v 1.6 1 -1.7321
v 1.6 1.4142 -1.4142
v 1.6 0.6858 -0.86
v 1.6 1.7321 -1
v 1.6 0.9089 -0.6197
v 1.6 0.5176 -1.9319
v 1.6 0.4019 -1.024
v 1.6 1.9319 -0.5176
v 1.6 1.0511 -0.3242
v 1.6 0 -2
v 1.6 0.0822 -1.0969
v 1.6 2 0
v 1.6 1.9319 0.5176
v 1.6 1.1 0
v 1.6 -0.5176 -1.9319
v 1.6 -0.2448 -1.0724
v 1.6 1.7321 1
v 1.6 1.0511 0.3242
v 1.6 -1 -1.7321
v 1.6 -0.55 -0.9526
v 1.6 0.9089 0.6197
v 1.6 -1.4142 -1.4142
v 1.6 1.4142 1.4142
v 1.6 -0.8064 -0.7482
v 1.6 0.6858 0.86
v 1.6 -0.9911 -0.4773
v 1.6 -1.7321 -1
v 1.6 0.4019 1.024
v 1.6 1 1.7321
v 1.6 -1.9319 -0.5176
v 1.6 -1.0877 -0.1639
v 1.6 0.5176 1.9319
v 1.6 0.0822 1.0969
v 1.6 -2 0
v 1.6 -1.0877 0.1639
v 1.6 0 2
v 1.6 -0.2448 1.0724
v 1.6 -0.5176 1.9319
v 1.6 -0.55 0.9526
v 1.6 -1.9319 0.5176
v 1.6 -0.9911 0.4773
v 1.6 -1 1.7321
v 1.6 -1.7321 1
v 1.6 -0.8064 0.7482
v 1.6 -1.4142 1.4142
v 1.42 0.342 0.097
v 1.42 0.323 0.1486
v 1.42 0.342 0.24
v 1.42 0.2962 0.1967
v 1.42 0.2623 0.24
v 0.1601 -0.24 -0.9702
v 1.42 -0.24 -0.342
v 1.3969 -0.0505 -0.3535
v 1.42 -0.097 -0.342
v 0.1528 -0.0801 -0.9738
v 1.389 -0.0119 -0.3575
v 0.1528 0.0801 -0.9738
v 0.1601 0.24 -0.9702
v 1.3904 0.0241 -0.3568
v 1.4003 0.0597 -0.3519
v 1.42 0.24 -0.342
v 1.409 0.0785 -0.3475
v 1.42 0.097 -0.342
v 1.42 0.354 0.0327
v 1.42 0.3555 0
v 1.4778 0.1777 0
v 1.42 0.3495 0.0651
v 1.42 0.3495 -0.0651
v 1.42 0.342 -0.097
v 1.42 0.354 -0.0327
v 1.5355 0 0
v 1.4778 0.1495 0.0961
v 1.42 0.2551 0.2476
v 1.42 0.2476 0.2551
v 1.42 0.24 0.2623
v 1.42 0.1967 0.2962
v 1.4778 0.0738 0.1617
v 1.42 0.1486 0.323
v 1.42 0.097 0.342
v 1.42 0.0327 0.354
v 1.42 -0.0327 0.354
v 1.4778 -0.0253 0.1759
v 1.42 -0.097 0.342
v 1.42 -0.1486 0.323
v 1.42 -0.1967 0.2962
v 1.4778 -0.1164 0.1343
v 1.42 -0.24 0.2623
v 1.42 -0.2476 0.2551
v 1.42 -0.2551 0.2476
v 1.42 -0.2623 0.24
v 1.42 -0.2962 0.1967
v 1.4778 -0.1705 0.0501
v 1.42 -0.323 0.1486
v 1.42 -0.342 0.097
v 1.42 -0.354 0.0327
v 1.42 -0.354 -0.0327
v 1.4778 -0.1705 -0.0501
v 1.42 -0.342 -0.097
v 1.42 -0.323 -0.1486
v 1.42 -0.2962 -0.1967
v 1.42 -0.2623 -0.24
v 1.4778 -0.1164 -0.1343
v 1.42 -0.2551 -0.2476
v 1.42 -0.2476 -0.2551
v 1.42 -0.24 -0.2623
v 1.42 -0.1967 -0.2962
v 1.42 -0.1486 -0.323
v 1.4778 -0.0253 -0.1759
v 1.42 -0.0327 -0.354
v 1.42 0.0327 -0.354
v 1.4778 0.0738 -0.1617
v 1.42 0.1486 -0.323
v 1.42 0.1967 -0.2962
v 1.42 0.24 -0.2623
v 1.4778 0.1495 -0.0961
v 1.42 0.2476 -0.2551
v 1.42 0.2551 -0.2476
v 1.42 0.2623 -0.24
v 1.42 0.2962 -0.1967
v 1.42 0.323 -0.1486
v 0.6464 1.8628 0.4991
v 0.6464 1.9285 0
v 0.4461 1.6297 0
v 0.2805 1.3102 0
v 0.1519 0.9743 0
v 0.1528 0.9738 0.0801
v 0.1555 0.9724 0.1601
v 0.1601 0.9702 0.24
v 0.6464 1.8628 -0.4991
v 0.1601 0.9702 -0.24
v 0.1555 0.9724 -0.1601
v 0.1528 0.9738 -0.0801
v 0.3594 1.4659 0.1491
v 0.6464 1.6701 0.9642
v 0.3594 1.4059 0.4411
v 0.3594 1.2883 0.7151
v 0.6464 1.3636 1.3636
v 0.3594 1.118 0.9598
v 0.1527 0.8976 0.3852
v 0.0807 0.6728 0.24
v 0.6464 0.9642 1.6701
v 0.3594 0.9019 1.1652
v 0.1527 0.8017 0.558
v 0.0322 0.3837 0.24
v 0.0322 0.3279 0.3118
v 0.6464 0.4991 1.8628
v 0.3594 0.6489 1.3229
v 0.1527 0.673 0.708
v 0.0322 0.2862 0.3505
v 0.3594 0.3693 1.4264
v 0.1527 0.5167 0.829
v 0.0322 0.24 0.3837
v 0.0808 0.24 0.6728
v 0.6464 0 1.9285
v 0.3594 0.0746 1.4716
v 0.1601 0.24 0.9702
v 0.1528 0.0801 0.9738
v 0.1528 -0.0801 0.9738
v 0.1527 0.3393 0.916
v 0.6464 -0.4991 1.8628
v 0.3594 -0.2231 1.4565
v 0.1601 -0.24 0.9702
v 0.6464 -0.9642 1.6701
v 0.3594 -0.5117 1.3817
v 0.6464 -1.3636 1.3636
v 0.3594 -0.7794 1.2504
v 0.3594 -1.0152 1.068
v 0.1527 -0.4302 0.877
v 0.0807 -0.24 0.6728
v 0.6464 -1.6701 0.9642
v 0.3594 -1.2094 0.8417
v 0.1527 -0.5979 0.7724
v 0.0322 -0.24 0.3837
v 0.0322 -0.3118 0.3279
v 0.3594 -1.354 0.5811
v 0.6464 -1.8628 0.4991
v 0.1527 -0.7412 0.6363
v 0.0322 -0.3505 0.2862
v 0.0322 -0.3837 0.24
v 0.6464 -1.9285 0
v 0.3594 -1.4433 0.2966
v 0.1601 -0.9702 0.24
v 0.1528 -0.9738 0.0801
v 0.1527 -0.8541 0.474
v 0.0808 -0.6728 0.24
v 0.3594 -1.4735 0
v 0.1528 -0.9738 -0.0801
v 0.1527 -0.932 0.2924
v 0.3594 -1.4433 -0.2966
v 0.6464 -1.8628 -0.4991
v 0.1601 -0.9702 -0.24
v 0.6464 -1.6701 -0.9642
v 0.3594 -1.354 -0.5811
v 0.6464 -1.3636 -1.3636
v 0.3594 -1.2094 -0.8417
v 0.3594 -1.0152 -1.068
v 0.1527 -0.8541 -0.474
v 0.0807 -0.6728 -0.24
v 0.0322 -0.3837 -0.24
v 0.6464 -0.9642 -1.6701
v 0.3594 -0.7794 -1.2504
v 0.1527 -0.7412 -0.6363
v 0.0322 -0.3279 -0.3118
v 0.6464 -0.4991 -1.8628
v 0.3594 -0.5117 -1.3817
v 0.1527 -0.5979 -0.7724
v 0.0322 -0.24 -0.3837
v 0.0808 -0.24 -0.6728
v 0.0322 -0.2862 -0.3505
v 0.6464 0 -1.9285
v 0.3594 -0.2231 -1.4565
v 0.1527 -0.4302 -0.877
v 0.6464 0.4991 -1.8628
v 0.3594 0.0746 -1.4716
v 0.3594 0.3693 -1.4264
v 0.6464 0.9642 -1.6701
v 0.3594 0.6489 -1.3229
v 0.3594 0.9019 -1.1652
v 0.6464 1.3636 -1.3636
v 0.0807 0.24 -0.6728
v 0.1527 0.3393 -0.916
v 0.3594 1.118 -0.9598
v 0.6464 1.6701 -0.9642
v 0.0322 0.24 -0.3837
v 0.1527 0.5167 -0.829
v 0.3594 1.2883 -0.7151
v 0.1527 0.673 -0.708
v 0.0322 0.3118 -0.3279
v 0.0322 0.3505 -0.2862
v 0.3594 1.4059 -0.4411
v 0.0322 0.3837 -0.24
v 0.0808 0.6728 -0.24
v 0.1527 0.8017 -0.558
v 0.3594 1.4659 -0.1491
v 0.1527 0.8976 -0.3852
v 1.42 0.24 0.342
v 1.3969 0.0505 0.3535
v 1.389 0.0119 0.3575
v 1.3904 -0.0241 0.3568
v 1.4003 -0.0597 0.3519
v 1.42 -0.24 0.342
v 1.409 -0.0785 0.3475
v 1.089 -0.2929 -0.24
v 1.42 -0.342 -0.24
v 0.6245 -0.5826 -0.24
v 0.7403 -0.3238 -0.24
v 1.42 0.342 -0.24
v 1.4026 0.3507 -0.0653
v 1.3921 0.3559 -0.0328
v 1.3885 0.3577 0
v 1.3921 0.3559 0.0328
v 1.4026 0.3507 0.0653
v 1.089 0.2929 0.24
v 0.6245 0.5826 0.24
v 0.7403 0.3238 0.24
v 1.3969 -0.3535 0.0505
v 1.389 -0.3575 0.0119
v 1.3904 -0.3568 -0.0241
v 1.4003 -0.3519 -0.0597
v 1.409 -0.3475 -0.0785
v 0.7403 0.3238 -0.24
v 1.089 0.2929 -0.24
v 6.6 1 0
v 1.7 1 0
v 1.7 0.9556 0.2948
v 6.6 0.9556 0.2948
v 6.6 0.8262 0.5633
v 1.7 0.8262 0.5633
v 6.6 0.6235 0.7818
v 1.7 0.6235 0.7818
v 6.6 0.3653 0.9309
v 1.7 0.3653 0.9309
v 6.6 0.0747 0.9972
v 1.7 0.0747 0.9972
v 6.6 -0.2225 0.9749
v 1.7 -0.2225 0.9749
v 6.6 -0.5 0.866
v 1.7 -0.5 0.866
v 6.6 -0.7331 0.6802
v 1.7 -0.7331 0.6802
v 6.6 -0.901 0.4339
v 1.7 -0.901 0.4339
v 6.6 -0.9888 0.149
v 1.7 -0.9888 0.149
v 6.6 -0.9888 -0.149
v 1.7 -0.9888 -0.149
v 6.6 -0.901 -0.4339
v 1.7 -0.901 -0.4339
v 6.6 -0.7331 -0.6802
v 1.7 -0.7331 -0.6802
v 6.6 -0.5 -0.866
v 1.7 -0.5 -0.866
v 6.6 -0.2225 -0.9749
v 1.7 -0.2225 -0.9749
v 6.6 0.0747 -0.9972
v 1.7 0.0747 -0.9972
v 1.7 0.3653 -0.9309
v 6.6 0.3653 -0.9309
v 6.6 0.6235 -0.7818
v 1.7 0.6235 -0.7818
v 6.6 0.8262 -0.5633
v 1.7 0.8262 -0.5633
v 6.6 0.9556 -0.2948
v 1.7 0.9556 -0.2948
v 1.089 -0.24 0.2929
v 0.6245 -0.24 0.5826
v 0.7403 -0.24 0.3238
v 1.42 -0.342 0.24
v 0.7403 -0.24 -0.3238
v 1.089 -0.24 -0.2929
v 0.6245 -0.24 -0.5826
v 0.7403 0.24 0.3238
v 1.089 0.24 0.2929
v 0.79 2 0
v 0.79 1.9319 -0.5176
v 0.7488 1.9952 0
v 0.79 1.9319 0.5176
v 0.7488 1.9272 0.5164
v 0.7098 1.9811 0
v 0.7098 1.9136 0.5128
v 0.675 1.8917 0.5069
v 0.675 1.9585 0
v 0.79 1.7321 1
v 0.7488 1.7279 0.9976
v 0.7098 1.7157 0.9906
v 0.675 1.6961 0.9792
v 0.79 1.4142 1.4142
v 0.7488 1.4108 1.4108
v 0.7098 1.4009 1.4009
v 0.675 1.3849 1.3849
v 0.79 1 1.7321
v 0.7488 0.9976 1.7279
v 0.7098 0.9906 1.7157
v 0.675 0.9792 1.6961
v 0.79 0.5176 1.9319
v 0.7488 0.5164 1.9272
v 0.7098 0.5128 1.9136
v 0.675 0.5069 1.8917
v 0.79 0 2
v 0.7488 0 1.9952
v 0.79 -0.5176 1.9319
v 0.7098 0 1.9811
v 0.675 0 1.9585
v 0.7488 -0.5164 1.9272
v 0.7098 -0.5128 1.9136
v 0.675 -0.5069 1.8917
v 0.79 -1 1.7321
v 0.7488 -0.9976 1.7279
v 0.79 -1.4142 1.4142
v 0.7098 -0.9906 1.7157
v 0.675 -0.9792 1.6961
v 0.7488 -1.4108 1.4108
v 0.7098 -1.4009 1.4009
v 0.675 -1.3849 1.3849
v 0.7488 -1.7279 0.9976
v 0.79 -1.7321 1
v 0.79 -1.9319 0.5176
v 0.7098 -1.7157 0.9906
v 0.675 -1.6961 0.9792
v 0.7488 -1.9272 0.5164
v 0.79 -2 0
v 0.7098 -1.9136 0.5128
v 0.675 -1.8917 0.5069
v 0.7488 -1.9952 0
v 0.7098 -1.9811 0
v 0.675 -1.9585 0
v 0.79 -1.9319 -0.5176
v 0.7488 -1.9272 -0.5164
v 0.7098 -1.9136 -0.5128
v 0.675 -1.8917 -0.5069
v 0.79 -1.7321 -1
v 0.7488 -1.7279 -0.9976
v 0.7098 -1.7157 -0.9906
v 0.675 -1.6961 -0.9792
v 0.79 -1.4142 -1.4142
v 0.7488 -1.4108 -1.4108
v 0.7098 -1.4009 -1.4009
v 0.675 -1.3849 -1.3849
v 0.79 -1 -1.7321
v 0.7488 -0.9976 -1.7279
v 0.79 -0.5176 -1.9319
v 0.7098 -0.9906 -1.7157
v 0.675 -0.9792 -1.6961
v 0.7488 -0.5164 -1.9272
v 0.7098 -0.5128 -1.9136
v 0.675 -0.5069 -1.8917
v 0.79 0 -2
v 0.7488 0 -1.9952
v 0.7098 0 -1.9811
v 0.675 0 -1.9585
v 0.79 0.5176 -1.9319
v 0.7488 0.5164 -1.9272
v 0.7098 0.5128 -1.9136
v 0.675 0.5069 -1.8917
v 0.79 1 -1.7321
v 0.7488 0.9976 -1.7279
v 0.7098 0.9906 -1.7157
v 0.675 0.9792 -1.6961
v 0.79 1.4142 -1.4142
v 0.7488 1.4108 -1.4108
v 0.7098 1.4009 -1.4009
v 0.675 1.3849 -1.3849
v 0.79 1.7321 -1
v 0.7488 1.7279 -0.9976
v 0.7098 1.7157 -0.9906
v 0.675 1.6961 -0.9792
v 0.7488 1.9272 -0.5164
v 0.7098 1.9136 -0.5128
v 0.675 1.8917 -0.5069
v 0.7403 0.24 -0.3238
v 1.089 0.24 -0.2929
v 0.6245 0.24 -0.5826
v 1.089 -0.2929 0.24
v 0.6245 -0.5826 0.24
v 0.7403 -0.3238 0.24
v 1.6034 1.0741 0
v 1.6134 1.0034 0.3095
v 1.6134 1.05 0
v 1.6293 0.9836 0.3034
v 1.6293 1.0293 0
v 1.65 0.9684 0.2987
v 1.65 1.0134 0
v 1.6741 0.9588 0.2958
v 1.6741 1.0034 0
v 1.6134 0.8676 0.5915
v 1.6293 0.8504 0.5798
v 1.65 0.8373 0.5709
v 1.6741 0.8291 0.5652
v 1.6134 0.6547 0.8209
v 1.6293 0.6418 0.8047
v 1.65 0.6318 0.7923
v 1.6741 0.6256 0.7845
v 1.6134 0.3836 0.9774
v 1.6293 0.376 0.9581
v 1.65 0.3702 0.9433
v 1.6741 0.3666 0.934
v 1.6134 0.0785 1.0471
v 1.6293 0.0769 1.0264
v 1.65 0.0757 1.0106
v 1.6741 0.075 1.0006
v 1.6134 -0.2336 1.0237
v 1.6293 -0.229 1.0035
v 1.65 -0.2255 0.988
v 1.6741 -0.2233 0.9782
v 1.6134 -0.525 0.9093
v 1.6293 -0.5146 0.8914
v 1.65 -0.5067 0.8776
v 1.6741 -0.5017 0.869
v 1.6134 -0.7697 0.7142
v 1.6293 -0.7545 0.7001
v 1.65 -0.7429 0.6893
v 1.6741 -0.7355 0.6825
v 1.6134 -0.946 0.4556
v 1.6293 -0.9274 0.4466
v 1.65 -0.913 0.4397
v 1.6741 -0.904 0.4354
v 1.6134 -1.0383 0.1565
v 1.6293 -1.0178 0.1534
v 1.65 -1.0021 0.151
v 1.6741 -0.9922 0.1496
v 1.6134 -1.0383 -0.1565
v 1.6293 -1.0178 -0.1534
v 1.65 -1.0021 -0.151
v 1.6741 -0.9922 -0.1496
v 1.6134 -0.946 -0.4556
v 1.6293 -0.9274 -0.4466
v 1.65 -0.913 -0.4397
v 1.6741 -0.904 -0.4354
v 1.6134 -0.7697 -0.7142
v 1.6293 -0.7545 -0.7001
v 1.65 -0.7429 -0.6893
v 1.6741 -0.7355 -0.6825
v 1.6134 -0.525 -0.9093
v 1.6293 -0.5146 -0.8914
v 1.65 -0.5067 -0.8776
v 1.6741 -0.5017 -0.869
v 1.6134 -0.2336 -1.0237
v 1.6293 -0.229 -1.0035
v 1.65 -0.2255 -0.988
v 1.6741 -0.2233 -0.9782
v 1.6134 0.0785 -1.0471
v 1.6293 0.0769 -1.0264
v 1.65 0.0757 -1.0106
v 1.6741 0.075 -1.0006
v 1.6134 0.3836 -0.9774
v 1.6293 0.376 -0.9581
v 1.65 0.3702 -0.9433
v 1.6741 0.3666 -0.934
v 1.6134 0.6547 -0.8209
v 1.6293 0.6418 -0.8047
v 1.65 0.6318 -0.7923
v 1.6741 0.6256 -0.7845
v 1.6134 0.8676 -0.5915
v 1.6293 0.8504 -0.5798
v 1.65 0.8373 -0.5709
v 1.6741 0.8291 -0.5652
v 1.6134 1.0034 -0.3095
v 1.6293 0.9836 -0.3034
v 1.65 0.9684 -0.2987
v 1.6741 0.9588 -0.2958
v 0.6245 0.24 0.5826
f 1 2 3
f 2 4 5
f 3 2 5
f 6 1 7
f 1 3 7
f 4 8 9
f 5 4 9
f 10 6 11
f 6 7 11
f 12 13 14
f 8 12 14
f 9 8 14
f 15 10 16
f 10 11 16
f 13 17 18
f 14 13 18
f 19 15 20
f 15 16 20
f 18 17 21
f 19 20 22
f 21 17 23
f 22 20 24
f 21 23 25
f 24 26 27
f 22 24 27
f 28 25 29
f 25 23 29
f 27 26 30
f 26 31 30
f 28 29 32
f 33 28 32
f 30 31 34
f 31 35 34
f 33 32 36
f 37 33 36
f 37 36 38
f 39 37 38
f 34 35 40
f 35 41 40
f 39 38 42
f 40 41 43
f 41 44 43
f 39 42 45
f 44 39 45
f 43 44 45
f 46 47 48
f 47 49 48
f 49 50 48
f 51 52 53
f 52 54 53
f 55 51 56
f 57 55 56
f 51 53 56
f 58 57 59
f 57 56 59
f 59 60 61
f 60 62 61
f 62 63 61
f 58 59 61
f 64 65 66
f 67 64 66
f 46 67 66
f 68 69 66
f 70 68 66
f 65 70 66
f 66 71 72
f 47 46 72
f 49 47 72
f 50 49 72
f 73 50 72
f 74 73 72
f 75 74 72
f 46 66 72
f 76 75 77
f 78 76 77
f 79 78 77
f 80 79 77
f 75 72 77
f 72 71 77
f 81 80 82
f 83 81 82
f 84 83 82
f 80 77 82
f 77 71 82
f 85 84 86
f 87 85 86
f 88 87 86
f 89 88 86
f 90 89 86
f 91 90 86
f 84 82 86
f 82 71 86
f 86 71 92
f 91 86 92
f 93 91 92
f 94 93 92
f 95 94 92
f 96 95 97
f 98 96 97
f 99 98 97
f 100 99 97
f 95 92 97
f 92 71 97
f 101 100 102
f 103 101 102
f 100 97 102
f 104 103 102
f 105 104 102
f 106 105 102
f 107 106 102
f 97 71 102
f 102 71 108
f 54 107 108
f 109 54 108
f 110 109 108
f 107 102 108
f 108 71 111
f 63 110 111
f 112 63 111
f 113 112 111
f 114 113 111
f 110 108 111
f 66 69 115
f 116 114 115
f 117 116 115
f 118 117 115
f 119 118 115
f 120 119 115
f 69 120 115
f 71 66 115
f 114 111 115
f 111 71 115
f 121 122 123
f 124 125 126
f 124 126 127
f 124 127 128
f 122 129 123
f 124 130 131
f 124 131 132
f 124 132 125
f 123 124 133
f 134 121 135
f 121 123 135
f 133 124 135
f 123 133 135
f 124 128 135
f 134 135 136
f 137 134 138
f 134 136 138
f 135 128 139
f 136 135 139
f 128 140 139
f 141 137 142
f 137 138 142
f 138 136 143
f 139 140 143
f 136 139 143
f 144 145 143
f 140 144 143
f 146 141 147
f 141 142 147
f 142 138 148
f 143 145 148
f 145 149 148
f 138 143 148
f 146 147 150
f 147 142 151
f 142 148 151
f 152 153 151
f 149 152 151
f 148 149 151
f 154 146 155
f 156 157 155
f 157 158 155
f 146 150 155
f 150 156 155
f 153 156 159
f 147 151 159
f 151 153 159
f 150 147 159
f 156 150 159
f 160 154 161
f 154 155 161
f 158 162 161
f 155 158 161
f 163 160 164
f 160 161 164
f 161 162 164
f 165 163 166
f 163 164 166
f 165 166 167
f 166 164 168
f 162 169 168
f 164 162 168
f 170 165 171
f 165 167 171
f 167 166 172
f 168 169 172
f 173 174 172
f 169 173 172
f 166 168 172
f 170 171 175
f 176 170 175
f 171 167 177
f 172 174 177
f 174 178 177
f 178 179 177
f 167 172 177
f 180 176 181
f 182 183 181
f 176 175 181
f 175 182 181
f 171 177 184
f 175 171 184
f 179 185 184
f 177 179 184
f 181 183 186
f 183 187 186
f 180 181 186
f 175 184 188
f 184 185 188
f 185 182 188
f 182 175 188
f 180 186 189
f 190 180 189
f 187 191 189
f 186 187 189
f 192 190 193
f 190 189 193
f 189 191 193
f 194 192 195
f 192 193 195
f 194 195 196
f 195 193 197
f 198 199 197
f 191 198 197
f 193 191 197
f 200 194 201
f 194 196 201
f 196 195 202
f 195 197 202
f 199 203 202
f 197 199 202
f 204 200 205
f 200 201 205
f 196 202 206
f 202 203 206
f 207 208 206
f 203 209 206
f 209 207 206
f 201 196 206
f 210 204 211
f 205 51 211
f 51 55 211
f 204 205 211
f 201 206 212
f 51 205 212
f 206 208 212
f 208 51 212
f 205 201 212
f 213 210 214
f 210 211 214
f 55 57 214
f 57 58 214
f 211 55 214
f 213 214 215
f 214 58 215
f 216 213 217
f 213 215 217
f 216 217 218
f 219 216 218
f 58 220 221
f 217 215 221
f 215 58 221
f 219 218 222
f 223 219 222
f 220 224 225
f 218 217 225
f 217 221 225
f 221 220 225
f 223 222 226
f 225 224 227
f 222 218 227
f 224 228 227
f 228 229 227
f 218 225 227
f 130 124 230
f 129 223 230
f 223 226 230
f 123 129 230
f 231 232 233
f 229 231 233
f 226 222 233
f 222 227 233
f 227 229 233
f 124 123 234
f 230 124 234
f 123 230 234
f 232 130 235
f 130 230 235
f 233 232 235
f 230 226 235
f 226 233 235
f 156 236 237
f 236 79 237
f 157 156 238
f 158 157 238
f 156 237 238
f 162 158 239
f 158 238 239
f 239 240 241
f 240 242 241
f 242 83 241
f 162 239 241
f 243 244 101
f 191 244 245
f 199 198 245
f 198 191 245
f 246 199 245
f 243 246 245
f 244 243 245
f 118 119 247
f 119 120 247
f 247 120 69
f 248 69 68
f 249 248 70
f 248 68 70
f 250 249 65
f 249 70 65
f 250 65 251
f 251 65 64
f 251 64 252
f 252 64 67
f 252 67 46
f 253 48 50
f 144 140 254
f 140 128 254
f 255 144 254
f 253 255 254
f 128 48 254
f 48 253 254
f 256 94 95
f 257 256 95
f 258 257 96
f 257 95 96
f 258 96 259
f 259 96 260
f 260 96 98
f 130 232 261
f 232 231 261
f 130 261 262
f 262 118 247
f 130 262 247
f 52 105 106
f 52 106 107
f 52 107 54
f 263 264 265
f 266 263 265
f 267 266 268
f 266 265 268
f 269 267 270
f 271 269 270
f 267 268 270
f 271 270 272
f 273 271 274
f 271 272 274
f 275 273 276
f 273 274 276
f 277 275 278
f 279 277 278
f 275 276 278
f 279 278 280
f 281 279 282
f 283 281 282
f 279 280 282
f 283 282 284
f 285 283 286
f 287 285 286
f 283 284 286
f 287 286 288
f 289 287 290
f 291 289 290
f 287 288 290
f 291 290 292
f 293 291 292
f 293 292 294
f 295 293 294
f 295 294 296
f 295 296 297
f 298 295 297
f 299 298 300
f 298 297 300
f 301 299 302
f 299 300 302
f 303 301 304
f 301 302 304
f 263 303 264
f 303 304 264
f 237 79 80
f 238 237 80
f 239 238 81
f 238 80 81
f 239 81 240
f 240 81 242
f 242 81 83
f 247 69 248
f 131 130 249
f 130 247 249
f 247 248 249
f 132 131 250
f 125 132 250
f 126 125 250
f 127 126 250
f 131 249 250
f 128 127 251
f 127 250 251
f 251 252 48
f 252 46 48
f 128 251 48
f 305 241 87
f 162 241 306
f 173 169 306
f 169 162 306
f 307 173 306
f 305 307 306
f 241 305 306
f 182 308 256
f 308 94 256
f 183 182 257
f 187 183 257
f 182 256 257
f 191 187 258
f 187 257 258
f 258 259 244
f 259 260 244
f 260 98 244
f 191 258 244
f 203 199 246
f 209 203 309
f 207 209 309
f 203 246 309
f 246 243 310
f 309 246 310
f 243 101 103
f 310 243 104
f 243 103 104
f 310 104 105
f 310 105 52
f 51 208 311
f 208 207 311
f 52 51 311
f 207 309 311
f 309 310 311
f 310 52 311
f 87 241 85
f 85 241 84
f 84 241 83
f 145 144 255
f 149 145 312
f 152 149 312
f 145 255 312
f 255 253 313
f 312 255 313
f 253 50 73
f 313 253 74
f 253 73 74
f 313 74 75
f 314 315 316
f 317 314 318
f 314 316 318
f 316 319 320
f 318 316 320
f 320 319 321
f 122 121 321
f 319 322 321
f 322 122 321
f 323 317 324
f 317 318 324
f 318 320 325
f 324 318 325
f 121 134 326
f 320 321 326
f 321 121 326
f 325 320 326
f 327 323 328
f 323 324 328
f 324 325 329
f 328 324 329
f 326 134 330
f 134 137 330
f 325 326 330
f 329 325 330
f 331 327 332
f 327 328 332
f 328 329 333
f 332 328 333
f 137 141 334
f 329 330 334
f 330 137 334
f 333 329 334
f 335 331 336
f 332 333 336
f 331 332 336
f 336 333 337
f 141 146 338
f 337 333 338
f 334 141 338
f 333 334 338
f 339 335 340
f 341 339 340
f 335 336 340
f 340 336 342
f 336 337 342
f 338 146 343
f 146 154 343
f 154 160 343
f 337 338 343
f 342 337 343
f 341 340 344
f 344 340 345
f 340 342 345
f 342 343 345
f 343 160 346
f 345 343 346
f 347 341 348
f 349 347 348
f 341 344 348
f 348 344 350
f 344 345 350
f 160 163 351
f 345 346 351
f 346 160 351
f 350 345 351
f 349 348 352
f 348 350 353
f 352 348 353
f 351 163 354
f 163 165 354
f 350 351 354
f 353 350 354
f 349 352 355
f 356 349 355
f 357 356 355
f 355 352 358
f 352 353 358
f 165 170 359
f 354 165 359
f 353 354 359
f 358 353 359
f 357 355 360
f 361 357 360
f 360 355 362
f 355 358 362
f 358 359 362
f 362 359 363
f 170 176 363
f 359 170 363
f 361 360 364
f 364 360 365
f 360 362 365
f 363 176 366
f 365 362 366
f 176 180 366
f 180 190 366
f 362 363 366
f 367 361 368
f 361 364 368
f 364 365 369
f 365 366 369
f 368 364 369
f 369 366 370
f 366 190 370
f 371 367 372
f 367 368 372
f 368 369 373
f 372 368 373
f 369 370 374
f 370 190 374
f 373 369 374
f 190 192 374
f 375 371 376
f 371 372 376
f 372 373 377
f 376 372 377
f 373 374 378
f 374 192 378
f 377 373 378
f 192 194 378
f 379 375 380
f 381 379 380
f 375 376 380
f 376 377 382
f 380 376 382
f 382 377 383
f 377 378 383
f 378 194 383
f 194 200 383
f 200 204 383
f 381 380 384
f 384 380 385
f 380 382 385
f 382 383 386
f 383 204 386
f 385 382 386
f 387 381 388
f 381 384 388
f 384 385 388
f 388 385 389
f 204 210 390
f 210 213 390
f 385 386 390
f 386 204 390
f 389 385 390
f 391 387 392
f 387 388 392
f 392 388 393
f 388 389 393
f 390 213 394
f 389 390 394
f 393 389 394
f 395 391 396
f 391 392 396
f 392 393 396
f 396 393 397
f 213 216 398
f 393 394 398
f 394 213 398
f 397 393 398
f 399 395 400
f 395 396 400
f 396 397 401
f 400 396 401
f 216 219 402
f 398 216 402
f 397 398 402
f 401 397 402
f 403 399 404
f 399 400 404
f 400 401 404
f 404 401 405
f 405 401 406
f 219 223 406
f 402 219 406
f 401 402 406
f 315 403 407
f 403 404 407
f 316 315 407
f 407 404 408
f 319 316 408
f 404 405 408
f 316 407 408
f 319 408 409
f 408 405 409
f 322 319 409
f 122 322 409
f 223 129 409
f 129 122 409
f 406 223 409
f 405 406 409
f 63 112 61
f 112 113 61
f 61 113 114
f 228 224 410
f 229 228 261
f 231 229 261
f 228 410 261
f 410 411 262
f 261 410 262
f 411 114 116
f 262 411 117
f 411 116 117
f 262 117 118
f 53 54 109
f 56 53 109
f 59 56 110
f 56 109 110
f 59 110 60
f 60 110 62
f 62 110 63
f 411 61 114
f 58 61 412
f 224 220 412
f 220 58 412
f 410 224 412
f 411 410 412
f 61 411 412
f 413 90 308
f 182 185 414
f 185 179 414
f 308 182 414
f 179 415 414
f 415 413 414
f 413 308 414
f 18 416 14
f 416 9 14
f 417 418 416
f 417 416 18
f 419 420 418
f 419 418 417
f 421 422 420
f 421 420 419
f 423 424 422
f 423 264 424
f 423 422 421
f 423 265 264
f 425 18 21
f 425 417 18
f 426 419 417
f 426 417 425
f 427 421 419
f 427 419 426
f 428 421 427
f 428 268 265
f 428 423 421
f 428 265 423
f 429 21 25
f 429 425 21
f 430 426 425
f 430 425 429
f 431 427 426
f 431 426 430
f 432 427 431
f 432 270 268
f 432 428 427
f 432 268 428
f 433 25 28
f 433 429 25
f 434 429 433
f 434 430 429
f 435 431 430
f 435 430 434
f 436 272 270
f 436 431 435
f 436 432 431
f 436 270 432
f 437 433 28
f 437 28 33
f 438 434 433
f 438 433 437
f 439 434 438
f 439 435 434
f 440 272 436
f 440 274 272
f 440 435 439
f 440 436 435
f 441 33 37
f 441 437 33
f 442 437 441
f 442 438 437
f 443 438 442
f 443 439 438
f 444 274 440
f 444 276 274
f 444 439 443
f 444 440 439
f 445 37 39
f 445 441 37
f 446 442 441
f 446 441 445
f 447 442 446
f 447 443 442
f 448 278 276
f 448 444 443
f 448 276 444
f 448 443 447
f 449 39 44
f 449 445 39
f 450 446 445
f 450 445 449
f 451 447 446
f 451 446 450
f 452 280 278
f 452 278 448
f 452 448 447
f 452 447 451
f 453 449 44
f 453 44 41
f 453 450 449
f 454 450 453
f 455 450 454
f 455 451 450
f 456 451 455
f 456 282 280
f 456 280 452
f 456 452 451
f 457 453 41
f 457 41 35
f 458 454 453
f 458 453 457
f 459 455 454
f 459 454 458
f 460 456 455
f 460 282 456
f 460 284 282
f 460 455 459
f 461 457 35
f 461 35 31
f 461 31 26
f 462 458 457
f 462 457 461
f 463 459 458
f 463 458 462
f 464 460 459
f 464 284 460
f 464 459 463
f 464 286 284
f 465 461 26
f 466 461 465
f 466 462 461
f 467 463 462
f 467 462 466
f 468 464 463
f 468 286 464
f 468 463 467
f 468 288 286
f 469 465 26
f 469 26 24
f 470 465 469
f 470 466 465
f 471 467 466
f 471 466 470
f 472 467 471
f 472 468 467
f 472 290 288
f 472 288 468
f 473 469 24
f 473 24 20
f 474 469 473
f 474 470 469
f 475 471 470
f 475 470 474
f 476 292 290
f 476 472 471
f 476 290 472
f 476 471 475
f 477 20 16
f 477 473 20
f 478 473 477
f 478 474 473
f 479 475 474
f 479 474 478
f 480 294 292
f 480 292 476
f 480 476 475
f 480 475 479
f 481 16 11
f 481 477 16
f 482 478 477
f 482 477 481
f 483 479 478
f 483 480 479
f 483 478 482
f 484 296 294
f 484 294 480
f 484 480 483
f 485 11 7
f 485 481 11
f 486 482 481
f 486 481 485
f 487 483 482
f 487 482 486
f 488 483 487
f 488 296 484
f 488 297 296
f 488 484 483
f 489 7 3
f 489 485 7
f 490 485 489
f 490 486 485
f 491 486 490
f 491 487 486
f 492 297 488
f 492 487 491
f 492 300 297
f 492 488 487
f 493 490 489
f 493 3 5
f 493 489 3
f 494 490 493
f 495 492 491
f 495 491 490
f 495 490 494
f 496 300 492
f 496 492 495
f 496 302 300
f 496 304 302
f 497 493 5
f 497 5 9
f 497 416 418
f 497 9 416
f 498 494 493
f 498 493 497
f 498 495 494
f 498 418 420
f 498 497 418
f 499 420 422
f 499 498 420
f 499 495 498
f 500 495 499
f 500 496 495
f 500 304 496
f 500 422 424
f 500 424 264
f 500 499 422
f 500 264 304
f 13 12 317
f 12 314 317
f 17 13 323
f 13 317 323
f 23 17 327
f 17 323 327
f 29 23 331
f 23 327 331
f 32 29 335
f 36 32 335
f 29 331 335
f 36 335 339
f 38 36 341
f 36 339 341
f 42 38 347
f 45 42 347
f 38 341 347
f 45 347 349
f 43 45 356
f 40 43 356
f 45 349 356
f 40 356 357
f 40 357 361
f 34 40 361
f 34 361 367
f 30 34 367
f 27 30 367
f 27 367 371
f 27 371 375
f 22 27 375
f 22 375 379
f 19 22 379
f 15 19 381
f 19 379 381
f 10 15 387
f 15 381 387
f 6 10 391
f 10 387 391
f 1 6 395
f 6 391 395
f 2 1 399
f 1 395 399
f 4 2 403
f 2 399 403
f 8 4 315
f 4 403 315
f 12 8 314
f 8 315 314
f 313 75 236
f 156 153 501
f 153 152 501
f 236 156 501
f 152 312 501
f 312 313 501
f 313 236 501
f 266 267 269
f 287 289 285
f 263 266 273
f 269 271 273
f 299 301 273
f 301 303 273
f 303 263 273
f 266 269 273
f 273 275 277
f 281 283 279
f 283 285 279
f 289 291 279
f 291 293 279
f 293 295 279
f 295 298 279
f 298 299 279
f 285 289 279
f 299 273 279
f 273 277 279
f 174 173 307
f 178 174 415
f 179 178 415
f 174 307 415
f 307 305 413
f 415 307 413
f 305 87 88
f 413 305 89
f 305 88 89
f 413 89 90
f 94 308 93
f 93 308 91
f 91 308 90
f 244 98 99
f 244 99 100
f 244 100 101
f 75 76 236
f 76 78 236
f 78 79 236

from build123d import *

# Parameters (mm, degrees)
FILLET1_R    = 0.1
SKETCH3_W    = 0.48
SKETCH3_H    = 2.1
SKETCH4_W    = 0.48
SKETCH4_H    = 0.68402847
RECPAT_COUNT = 2
RECPAT_ANGLE = 90


with BuildPart() as part:
    # BodySke → Base-Revolve (revolve)
    with BuildSketch(Plane.XY):
        with BuildLine():
            Line((1.6, 1), (1.6, 2))
            Line((1.6, 2), (0.790020747, 2))
            ThreePointArc((0.790020747, 2), (0.709789294, 1.981130115), (0.646379599, 1.928476821))
            ThreePointArc((0.646379599, 1.928476821), (0.165895084, 1.016959861), (0, 0))
            Line((0, 0), (6.6, 0))
            Line((6.6, 0), (6.6, 1))
            Line((6.6, 1), (1.6, 1))
        make_face()
    revolve(axis=Axis((-25.4, 0, 0), (1, 0, 0)))

    # Fillet1
    fillet1_edges = [part.edges().sort_by_distance(p)[0] for p in [
        (1.6, -1, 0),
    ]]
    fillet(fillet1_edges, radius=FILLET1_R)

    # Sketch3 → Recess section 0
    with BuildSketch(Plane(origin=(0, 0, 0), x_dir=(0, 0, -1), z_dir=(1, 0, 0))):
        Rectangle(SKETCH3_W, SKETCH3_H)
    # Sketch4 → Recess section 1
    with BuildSketch(Plane(origin=(1.42, 0, 0), x_dir=(0, 0, -1), z_dir=(1, 0, 0))):
        Rectangle(SKETCH4_W, SKETCH4_H)
    recess = loft(mode=Mode.SUBTRACT)

    # RecPat: Recess ×2 about axis
    recpat_axis = Axis((0, 0, 0), (1, 0, 0))
    for i in range(1, RECPAT_COUNT):
        add(recess.rotate(recpat_axis, i * RECPAT_ANGLE / (RECPAT_COUNT - 1)), mode=Mode.SUBTRACT)

    # RecCorSke → RecessCore (revolve, cut)
    with BuildSketch(Plane.XY):
        Polygon((0, 0), (0, 0.454796073), (1.42, 0.3555), (1.535508952, 0), align=None)
    revolve(axis=Axis((-3.175, 0, 0), (1, 0, 0)), mode=Mode.SUBTRACT)


solid = part.part
